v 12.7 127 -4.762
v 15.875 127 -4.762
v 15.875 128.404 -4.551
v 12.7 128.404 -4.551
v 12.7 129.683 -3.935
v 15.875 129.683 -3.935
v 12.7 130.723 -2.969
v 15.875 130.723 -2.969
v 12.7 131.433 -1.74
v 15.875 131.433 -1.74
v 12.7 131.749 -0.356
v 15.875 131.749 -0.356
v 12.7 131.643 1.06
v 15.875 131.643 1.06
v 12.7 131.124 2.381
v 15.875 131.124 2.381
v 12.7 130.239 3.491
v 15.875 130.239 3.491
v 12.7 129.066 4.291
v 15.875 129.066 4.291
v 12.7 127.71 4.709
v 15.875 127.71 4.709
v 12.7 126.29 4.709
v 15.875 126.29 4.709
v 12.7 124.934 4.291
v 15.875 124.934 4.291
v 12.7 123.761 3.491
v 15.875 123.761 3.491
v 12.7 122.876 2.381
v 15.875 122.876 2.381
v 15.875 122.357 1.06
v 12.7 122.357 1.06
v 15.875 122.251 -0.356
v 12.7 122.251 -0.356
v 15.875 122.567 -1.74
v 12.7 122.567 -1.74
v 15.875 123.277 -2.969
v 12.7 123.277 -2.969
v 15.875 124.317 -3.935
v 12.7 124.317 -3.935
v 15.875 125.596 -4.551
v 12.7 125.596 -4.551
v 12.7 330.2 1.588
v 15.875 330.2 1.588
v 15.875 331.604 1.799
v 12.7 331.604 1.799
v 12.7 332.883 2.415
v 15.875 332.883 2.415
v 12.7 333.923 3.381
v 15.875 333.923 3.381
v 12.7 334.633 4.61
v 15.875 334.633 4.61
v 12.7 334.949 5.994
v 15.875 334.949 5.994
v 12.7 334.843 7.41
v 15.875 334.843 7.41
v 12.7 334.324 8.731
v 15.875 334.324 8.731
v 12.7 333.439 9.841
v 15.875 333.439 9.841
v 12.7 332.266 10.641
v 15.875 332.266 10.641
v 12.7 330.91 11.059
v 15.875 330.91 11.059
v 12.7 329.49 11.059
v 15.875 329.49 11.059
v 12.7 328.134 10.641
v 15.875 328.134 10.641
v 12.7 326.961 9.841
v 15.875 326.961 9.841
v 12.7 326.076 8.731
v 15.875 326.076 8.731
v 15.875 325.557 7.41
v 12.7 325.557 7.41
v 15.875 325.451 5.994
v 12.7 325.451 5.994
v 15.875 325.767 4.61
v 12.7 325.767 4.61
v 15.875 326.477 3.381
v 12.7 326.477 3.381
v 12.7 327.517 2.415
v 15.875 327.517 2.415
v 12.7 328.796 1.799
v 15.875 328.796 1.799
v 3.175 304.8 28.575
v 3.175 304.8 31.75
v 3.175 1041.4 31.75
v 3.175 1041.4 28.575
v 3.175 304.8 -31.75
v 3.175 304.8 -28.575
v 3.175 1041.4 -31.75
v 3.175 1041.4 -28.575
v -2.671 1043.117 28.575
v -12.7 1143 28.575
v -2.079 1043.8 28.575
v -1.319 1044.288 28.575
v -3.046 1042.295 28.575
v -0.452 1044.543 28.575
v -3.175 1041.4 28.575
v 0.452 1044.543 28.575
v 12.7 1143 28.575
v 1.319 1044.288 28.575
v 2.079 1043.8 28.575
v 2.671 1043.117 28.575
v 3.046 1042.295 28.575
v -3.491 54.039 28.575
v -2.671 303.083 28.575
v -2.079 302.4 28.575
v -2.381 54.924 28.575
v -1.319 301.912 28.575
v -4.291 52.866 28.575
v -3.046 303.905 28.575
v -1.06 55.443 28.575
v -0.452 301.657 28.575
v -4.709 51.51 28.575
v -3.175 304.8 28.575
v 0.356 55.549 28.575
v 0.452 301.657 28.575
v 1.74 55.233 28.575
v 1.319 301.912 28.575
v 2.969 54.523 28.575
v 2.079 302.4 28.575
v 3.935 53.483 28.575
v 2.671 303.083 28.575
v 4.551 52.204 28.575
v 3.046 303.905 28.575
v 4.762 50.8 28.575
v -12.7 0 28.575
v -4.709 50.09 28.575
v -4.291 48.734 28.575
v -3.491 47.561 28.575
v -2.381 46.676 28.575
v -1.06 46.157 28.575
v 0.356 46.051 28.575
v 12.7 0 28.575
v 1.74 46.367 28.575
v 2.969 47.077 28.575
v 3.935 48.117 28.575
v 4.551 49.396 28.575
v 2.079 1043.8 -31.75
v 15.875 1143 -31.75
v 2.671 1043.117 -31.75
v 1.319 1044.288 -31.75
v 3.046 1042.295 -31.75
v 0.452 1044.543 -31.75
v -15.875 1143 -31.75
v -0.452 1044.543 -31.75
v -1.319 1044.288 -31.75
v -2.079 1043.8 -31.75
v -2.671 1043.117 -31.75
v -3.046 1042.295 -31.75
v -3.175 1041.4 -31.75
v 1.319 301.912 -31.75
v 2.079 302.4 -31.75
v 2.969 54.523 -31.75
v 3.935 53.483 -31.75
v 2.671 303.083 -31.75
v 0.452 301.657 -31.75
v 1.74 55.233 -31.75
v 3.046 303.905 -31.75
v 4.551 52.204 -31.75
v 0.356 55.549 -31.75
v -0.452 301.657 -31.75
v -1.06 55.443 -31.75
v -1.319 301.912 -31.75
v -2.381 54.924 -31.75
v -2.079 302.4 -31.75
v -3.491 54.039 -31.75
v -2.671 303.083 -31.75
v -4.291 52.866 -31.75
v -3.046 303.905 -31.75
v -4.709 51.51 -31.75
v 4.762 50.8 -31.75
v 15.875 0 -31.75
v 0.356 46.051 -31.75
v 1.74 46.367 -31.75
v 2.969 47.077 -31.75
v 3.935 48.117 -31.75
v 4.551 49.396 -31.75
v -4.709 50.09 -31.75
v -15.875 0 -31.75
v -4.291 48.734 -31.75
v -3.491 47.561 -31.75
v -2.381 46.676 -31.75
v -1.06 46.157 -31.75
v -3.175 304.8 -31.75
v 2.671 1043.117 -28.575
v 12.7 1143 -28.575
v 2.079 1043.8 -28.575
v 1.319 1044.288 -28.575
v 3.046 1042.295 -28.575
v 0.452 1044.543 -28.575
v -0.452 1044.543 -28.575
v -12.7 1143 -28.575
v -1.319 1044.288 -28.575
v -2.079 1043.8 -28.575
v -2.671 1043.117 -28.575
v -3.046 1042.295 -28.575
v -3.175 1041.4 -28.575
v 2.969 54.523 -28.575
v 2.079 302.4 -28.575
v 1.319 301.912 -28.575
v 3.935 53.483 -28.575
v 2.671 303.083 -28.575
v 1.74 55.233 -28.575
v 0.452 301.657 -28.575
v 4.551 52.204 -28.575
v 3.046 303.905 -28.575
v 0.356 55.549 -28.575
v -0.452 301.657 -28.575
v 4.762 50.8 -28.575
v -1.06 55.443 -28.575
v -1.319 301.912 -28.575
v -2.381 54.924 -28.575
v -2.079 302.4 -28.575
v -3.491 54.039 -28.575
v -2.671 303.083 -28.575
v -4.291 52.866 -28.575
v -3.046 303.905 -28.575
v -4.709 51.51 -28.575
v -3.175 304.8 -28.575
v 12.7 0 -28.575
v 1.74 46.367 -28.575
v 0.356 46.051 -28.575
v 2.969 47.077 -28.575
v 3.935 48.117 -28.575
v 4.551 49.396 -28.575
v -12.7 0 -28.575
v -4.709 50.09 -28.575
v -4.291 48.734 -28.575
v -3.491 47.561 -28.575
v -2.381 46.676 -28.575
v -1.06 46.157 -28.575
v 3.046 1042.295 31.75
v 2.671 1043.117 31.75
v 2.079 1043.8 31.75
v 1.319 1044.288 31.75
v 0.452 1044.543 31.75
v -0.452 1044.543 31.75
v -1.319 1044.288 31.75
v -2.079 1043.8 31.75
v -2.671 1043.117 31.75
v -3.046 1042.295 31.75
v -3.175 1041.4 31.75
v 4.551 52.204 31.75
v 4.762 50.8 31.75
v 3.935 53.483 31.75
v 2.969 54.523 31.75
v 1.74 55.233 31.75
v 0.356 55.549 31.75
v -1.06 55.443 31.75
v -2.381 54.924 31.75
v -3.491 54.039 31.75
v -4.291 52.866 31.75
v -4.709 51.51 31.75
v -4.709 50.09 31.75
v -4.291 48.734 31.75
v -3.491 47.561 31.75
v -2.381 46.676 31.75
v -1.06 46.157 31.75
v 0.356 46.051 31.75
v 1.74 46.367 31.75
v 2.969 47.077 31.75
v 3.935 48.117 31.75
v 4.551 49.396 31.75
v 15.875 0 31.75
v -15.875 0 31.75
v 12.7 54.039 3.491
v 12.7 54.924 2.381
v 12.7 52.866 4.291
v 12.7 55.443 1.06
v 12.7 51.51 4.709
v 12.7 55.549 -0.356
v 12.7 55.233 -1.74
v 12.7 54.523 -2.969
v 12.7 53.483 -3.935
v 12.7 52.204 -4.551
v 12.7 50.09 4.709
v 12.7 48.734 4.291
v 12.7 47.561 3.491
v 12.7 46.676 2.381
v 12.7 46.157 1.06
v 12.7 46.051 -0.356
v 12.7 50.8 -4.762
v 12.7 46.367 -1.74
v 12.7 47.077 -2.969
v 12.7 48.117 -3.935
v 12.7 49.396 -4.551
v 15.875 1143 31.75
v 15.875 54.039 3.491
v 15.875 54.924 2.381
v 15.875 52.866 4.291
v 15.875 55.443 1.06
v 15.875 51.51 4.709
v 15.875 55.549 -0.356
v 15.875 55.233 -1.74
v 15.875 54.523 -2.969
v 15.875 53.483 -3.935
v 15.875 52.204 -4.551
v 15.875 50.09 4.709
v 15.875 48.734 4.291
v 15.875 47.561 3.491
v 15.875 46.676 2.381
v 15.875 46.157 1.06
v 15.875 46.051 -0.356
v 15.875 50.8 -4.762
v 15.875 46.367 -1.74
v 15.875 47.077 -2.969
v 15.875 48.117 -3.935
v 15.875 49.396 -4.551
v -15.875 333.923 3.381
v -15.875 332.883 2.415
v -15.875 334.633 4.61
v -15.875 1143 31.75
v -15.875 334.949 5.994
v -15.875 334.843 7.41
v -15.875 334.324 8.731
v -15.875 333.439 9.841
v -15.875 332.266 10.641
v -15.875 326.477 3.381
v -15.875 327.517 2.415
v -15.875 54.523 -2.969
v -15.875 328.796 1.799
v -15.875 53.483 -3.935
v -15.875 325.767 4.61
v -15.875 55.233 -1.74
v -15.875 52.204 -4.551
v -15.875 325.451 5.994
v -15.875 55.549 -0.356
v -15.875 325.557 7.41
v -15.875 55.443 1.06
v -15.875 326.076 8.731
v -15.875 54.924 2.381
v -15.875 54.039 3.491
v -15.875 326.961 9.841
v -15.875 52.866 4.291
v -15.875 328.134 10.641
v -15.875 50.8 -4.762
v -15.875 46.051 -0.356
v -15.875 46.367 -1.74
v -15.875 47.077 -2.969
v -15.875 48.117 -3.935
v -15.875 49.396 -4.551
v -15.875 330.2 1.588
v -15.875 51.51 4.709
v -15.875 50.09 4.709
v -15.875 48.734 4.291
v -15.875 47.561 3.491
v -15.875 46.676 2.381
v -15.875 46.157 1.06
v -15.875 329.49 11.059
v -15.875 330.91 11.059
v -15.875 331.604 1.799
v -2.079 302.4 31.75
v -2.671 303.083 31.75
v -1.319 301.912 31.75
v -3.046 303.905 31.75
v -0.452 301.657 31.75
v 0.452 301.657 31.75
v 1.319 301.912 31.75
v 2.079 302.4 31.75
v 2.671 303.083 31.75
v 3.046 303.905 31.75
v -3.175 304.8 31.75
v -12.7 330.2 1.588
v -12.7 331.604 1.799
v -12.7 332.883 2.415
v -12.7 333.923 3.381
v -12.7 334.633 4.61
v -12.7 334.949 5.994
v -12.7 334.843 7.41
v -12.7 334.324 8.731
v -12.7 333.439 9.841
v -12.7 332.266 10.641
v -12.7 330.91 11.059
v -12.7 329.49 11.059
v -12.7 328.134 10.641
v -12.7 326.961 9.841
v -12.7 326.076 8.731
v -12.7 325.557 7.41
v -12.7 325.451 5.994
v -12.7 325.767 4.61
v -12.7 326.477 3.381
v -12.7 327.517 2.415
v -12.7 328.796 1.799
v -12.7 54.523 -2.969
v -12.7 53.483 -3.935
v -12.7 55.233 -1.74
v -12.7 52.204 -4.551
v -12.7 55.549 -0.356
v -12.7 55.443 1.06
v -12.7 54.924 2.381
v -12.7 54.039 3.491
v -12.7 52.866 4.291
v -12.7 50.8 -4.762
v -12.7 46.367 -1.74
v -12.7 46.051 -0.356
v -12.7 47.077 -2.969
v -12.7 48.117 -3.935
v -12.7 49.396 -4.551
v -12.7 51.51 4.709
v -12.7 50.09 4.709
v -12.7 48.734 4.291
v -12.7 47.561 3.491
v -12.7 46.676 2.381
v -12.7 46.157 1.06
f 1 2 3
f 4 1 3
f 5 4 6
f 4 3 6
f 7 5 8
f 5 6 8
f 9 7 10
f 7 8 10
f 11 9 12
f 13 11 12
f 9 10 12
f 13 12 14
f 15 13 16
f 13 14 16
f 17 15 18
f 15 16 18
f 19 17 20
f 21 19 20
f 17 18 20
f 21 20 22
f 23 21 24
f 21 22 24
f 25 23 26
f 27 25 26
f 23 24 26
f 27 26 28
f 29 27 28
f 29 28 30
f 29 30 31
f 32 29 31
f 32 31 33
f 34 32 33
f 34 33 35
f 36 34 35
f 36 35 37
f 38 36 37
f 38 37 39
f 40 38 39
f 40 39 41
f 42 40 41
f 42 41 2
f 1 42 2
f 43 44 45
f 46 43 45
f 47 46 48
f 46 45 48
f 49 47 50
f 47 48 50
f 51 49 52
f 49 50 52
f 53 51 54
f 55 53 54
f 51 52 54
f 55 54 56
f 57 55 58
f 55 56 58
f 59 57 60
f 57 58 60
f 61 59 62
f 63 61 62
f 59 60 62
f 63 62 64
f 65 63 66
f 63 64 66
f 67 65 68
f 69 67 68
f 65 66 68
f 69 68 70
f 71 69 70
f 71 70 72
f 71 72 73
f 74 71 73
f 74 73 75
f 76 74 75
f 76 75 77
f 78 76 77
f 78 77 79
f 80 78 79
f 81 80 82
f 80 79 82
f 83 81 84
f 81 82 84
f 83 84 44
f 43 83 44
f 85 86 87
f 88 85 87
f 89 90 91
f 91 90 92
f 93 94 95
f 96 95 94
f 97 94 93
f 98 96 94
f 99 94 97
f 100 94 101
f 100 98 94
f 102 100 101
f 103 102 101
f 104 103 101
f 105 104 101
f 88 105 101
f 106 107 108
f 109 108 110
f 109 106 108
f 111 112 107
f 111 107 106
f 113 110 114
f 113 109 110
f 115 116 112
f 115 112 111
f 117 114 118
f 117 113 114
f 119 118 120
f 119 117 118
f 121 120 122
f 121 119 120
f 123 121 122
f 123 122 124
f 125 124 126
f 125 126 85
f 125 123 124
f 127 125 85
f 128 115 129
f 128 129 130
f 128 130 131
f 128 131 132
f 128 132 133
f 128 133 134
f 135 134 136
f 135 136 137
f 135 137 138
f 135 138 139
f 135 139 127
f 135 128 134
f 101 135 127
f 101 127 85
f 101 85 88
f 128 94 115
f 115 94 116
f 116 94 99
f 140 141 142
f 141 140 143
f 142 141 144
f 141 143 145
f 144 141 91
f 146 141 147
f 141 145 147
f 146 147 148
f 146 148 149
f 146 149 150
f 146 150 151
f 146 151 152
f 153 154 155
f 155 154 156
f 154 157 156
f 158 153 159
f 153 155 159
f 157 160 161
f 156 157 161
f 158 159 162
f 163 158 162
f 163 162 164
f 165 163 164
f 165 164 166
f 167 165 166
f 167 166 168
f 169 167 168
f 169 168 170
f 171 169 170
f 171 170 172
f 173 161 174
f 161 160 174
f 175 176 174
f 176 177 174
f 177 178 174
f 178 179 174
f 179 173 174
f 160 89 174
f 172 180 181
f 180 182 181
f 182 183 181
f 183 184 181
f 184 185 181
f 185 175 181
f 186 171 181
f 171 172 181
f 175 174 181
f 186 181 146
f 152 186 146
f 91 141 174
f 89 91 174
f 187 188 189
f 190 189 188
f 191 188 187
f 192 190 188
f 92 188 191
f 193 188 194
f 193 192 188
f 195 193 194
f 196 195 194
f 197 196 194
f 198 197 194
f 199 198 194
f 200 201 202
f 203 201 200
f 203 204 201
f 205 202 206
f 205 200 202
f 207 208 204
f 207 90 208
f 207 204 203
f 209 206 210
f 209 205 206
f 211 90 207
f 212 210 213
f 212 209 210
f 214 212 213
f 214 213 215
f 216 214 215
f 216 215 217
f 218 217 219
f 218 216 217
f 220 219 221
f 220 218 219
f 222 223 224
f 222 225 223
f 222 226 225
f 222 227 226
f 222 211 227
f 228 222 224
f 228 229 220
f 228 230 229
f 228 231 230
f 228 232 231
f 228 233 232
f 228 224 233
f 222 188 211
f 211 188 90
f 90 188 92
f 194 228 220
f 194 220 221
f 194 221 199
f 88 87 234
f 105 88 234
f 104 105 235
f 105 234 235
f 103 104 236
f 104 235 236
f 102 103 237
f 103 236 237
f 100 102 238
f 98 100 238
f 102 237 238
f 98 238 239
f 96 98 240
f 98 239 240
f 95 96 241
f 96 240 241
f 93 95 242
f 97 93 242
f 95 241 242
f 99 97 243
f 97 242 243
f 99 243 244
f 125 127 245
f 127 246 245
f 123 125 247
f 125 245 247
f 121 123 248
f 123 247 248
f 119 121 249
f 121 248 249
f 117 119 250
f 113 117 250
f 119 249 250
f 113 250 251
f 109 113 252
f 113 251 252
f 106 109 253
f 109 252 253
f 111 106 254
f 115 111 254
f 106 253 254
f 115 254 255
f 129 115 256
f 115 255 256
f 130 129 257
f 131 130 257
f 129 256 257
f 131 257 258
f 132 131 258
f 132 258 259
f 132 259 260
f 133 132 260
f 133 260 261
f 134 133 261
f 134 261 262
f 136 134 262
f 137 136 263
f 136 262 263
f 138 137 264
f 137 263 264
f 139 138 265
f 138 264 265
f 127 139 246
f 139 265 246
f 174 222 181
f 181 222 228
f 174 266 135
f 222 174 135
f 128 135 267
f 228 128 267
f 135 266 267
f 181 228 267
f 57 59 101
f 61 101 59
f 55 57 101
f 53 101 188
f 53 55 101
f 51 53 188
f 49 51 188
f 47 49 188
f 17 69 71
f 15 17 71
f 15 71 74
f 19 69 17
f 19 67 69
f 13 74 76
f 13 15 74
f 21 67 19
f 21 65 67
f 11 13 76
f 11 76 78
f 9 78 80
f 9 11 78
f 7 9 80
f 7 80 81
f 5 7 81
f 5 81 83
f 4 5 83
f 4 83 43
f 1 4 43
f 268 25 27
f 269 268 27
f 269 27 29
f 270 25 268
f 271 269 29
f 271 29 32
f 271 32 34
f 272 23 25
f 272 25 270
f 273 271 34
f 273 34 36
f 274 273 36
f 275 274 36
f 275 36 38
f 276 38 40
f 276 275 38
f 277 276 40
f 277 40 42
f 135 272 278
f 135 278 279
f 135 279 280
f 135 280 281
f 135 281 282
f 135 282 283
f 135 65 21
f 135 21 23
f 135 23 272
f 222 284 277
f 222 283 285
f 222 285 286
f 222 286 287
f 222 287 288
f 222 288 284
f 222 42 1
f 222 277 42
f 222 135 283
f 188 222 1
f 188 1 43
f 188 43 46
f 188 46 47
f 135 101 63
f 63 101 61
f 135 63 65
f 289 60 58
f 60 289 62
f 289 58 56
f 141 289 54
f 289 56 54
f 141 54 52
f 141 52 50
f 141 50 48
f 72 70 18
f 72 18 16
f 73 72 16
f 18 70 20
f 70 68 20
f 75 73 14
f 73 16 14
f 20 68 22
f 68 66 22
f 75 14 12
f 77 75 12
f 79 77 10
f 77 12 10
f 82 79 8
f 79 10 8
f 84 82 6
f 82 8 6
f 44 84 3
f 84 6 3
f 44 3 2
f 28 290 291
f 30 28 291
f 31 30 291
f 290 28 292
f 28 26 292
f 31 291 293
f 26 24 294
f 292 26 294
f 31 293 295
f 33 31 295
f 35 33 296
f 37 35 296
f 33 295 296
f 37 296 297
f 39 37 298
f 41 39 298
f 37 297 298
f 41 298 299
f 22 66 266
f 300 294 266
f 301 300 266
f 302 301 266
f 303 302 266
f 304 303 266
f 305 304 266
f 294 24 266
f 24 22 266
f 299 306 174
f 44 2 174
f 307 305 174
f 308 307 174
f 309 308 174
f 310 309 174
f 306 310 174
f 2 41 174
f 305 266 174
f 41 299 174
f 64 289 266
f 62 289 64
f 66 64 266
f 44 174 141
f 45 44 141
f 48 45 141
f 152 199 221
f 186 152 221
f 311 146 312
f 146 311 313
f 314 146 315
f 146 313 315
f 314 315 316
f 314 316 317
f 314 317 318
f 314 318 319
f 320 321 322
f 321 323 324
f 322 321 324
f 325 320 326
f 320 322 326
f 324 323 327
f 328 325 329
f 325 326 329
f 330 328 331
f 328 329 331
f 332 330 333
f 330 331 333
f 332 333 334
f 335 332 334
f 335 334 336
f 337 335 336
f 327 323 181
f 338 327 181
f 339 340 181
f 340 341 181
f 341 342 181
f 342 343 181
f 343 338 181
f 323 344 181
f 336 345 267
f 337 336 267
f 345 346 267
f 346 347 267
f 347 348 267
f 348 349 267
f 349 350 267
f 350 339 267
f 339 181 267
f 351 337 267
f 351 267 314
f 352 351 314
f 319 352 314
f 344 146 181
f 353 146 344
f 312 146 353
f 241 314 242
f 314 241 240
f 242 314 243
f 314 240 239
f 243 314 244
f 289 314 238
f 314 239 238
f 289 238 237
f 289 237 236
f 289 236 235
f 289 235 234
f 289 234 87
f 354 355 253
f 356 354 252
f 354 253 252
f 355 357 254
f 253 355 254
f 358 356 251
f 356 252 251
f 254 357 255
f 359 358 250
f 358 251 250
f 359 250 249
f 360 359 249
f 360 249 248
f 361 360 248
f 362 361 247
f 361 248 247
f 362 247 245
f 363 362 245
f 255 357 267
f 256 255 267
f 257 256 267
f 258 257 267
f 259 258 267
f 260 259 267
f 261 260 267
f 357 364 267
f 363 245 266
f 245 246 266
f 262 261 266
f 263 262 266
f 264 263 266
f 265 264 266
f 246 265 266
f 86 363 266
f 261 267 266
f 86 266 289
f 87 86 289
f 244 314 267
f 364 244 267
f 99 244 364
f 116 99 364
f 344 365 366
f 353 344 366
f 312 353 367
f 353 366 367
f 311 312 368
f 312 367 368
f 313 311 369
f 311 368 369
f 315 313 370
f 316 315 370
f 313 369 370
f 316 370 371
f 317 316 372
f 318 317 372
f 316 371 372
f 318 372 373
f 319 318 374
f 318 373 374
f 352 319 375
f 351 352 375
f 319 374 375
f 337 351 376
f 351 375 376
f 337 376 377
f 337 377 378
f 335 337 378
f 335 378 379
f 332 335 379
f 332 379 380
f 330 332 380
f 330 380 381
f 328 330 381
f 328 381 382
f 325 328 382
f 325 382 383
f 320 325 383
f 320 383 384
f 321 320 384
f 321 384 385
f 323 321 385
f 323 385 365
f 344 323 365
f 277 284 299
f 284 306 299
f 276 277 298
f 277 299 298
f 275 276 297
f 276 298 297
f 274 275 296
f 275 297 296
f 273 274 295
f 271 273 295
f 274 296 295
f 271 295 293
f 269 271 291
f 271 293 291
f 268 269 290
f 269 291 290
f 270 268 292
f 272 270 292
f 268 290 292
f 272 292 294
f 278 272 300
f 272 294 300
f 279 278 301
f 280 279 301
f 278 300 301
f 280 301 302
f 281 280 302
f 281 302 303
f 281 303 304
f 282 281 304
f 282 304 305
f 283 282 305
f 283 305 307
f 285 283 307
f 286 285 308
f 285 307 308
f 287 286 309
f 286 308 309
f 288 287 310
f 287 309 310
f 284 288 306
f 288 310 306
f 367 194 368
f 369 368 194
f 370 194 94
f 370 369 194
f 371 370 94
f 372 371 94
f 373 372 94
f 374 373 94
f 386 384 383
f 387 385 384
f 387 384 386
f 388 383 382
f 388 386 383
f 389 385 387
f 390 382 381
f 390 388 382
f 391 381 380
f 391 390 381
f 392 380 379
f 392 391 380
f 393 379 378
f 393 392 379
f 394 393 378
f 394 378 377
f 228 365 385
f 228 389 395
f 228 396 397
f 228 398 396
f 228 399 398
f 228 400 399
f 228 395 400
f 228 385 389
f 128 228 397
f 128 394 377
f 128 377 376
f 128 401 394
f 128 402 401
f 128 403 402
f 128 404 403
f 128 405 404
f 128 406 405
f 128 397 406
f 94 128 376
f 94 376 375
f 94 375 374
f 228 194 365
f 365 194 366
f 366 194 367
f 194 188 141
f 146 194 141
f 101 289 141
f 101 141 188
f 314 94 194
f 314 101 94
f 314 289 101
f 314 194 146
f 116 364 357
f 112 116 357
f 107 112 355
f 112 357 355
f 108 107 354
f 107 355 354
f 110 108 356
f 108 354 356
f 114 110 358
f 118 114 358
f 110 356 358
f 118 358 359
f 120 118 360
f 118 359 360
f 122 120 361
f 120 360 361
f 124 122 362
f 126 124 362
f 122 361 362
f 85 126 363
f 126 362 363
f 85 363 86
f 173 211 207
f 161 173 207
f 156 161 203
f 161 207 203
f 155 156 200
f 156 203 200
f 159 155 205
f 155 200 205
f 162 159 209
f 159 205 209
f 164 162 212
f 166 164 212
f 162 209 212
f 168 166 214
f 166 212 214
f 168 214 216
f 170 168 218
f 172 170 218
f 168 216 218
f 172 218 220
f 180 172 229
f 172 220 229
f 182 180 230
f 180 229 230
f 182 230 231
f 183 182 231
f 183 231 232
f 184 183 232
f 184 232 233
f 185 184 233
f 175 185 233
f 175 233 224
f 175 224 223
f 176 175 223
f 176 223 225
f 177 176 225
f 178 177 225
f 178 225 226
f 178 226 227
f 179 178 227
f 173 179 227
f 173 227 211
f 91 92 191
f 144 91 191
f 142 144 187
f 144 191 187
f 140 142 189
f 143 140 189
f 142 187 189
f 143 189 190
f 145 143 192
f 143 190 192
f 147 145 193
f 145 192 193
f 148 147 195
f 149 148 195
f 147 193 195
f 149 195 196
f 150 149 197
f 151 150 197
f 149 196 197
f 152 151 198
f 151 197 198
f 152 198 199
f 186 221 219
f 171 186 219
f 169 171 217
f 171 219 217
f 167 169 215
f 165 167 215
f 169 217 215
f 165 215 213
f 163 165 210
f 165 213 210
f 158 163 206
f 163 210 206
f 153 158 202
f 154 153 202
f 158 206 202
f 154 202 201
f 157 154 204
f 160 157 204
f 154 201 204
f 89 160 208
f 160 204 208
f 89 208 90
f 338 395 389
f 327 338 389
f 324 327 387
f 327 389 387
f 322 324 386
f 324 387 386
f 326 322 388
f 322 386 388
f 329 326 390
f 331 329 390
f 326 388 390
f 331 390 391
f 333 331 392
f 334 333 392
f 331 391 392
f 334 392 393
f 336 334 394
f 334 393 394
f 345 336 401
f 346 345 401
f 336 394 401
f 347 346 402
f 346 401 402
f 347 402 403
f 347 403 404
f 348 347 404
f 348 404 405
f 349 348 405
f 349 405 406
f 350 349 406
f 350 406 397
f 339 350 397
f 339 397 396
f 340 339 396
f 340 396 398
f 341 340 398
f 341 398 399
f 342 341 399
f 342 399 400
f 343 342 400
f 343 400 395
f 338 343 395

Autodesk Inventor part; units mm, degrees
ref_plane "YZ Plane" through (0, 0, 0) normal (1, 0, 0) x (0, 1, 0)
ref_plane "XZ Plane" through (0, 0, 0) normal (0, 1, 0) x (-1, 0, 0)
ref_plane "XY Plane" through (0, 0, 0) normal (0, 0, 1) x (1, 0, 0)
sketch "Sketch1" plane through (0, 0, 0) normal (0, 1, 0) x (-1, 0, 0)
  line L0 (15.875, 31.75) -> (-15.875, 31.75)
  line L1 (-15.875, 31.75) -> (-15.875, -31.75)
  line L2 (-15.875, -31.75) -> (15.875, -31.75)
  line L3 (15.875, -31.75) -> (15.875, 31.75)
  line L4 (15.875, 31.75) -> (-15.875, -31.75) construction
  line L5 (-15.875, 31.75) -> (15.875, -31.75) construction
  line L6 (12.7, 28.575) -> (-12.7, 28.575)
  line L7 (-12.7, 28.575) -> (-12.7, -28.575)
  line L8 (-12.7, -28.575) -> (12.7, -28.575)
  line L9 (12.7, -28.575) -> (12.7, 28.575)
  line L10 (12.7, 28.575) -> (-12.7, -28.575) construction
  line L11 (-12.7, 28.575) -> (12.7, -28.575) construction
  point P0 (0, 0)
  dimension "d0" = 63.5
  dimension "d1" = 3.175
  dimension "d26" = 3.175
  dimension "d27" = 31.75
extrude "Extrusion1" add sketch "Sketch1" along normal blind 1143
sketch "Sketch4" plane through (-15.875, 0, 31.75) normal (0, 0, 1) x (1, 0, 0)
  line L0 (15.875, 0) -> (15.875, 1143) construction
  line L1 (15.875, 304.8) -> (15.875, 1041.4) construction
  line L2 (19.05, 304.8) -> (19.05, 1041.4)
  line L3 (12.7, 1041.4) -> (12.7, 304.8)
  arc A0 (12.7, 304.8) -> (19.05, 304.8) centre (15.875, 304.8) ccw
  arc A1 (19.05, 1041.4) -> (12.7, 1041.4) centre (15.875, 1041.4) ccw
  line L4 (0, 1143) -> (31.75, 1143) projected
  line L5 (0, 0) -> (31.75, 0) projected
  point P0 (15.875, 673.1)
  dimension "d6" = 6.35
  dimension "d7" = 101.6
  dimension "d8" = 304.8
  dimension "d28" = 736.6
extrude "Extrusion3" cut sketch "Sketch4" against normal through all
sketch "Sketch5" plane through (15.875, 0, 31.75) normal (1, 0, 0) x (0, 0, -1)
  circle A0 centre (31.75, 127) radius 4.7625
  line L0 (0, 0) -> (63.5, 0) projected
  line L1 (0, 0) -> (0, 1143) projected
  point P0 (31.75, 0)
  dimension "d11" = 9.525
  dimension "d12" = 127
  dimension "d25" = 31.75
extrude "Extrusion4" cut sketch "Sketch5" against normal up to next
sketch "Sketch6" plane through (-15.875, 0, 31.75) normal (0, 0, 1) x (1, 0, 0)
  circle A0 centre (15.875, 50.8) radius 4.7625
  line L0 (0, 0) -> (31.75, 0) projected
  line L1 (0, 0) -> (0, 1143) projected
  point P0 (15.875, 0)
  dimension "d15" = 9.525
  dimension "d16" = 50.8
  dimension "d24" = 15.875
extrude "Extrusion5" cut sketch "Sketch6" against normal through all
sketch "Sketch7" plane through (15.875, 0, 31.75) normal (1, 0, 0) x (0, 0, -1)
  circle A0 centre (31.75, 50.8) radius 4.7625
  line L0 (0, 0) -> (63.5, 0) projected
  line L1 (31.75, 0) -> (31.75, 96.4703) construction
  line L2 (0, 0) -> (0, 1143) construction
  dimension "d19" = 9.525
  dimension "d20" = 50.8
  dimension "d23" = 31.75
extrude "Extrusion6" cut sketch "Sketch7" against normal through all
sketch "Sketch8" plane through (15.875, 0, 31.75) normal (1, 0, 0) x (0, 0, -1)
  circle A0 centre (25.4, 330.2) radius 4.7625
  line L0 (0, 1143) -> (63.5, 1143) projected
  point P0 (31.75, 0)
  dimension "d29" = 9.525
  dimension "d30" = 812.8
extrude "Extrusion7" cut sketch "Sketch8" against normal through all
equation "\"d0\" = tubeBreadth"
equation "\"d1\" = tubeThickness"
equation "\"d27\" = tubeWidth"
equation "\"d2\" = tubeLength"
equation "\"d6\" = slotWidth"
equation "\"d7\" = slotDistanceFromTop"
equation "\"d8\" = slotDistanceFromBottom"
equation "\"d25\" = 0.5 * tubeBreadth"
equation "\"d15\" = axelDiam"
equation "\"d16\" = axelHeightAboveBottomOfTube"
equation "\"d24\" = 0.5 * tubeWidth"
equation "\"d19\" = axelDiam"
equation "\"d20\" = axelHeightAboveBottomOfTube"
equation "\"d23\" = 0.5 * tubeBreadth"
equation "\"d29\" = stopHoleDiam"
equation "\"d30\" = stopHoleDistanceFromTop"
equation "\"tubeBreadth\" = 63.5"
equation "\"tubeThickness\" = 3.175"
equation "\"tubeLength\" = 1143"
equation "\"slotDistanceFromBottom\" = 304.8"
equation "\"slotDistanceFromTop\" = 101.6"
equation "\"slotWidth\" = 6.35"
equation "\"axelDiam\" = 9.525"
equation "\"axelHeightAboveBottomOfTube\" = 50.8"
equation "\"tubeWidth\" = 31.75"
equation "\"stopHoleDiam\" = 9.525"
equation "\"stopHoleDistanceFromTop\" = 812.8"
properties part number "OuterTube" material "Aluminum 6061"
